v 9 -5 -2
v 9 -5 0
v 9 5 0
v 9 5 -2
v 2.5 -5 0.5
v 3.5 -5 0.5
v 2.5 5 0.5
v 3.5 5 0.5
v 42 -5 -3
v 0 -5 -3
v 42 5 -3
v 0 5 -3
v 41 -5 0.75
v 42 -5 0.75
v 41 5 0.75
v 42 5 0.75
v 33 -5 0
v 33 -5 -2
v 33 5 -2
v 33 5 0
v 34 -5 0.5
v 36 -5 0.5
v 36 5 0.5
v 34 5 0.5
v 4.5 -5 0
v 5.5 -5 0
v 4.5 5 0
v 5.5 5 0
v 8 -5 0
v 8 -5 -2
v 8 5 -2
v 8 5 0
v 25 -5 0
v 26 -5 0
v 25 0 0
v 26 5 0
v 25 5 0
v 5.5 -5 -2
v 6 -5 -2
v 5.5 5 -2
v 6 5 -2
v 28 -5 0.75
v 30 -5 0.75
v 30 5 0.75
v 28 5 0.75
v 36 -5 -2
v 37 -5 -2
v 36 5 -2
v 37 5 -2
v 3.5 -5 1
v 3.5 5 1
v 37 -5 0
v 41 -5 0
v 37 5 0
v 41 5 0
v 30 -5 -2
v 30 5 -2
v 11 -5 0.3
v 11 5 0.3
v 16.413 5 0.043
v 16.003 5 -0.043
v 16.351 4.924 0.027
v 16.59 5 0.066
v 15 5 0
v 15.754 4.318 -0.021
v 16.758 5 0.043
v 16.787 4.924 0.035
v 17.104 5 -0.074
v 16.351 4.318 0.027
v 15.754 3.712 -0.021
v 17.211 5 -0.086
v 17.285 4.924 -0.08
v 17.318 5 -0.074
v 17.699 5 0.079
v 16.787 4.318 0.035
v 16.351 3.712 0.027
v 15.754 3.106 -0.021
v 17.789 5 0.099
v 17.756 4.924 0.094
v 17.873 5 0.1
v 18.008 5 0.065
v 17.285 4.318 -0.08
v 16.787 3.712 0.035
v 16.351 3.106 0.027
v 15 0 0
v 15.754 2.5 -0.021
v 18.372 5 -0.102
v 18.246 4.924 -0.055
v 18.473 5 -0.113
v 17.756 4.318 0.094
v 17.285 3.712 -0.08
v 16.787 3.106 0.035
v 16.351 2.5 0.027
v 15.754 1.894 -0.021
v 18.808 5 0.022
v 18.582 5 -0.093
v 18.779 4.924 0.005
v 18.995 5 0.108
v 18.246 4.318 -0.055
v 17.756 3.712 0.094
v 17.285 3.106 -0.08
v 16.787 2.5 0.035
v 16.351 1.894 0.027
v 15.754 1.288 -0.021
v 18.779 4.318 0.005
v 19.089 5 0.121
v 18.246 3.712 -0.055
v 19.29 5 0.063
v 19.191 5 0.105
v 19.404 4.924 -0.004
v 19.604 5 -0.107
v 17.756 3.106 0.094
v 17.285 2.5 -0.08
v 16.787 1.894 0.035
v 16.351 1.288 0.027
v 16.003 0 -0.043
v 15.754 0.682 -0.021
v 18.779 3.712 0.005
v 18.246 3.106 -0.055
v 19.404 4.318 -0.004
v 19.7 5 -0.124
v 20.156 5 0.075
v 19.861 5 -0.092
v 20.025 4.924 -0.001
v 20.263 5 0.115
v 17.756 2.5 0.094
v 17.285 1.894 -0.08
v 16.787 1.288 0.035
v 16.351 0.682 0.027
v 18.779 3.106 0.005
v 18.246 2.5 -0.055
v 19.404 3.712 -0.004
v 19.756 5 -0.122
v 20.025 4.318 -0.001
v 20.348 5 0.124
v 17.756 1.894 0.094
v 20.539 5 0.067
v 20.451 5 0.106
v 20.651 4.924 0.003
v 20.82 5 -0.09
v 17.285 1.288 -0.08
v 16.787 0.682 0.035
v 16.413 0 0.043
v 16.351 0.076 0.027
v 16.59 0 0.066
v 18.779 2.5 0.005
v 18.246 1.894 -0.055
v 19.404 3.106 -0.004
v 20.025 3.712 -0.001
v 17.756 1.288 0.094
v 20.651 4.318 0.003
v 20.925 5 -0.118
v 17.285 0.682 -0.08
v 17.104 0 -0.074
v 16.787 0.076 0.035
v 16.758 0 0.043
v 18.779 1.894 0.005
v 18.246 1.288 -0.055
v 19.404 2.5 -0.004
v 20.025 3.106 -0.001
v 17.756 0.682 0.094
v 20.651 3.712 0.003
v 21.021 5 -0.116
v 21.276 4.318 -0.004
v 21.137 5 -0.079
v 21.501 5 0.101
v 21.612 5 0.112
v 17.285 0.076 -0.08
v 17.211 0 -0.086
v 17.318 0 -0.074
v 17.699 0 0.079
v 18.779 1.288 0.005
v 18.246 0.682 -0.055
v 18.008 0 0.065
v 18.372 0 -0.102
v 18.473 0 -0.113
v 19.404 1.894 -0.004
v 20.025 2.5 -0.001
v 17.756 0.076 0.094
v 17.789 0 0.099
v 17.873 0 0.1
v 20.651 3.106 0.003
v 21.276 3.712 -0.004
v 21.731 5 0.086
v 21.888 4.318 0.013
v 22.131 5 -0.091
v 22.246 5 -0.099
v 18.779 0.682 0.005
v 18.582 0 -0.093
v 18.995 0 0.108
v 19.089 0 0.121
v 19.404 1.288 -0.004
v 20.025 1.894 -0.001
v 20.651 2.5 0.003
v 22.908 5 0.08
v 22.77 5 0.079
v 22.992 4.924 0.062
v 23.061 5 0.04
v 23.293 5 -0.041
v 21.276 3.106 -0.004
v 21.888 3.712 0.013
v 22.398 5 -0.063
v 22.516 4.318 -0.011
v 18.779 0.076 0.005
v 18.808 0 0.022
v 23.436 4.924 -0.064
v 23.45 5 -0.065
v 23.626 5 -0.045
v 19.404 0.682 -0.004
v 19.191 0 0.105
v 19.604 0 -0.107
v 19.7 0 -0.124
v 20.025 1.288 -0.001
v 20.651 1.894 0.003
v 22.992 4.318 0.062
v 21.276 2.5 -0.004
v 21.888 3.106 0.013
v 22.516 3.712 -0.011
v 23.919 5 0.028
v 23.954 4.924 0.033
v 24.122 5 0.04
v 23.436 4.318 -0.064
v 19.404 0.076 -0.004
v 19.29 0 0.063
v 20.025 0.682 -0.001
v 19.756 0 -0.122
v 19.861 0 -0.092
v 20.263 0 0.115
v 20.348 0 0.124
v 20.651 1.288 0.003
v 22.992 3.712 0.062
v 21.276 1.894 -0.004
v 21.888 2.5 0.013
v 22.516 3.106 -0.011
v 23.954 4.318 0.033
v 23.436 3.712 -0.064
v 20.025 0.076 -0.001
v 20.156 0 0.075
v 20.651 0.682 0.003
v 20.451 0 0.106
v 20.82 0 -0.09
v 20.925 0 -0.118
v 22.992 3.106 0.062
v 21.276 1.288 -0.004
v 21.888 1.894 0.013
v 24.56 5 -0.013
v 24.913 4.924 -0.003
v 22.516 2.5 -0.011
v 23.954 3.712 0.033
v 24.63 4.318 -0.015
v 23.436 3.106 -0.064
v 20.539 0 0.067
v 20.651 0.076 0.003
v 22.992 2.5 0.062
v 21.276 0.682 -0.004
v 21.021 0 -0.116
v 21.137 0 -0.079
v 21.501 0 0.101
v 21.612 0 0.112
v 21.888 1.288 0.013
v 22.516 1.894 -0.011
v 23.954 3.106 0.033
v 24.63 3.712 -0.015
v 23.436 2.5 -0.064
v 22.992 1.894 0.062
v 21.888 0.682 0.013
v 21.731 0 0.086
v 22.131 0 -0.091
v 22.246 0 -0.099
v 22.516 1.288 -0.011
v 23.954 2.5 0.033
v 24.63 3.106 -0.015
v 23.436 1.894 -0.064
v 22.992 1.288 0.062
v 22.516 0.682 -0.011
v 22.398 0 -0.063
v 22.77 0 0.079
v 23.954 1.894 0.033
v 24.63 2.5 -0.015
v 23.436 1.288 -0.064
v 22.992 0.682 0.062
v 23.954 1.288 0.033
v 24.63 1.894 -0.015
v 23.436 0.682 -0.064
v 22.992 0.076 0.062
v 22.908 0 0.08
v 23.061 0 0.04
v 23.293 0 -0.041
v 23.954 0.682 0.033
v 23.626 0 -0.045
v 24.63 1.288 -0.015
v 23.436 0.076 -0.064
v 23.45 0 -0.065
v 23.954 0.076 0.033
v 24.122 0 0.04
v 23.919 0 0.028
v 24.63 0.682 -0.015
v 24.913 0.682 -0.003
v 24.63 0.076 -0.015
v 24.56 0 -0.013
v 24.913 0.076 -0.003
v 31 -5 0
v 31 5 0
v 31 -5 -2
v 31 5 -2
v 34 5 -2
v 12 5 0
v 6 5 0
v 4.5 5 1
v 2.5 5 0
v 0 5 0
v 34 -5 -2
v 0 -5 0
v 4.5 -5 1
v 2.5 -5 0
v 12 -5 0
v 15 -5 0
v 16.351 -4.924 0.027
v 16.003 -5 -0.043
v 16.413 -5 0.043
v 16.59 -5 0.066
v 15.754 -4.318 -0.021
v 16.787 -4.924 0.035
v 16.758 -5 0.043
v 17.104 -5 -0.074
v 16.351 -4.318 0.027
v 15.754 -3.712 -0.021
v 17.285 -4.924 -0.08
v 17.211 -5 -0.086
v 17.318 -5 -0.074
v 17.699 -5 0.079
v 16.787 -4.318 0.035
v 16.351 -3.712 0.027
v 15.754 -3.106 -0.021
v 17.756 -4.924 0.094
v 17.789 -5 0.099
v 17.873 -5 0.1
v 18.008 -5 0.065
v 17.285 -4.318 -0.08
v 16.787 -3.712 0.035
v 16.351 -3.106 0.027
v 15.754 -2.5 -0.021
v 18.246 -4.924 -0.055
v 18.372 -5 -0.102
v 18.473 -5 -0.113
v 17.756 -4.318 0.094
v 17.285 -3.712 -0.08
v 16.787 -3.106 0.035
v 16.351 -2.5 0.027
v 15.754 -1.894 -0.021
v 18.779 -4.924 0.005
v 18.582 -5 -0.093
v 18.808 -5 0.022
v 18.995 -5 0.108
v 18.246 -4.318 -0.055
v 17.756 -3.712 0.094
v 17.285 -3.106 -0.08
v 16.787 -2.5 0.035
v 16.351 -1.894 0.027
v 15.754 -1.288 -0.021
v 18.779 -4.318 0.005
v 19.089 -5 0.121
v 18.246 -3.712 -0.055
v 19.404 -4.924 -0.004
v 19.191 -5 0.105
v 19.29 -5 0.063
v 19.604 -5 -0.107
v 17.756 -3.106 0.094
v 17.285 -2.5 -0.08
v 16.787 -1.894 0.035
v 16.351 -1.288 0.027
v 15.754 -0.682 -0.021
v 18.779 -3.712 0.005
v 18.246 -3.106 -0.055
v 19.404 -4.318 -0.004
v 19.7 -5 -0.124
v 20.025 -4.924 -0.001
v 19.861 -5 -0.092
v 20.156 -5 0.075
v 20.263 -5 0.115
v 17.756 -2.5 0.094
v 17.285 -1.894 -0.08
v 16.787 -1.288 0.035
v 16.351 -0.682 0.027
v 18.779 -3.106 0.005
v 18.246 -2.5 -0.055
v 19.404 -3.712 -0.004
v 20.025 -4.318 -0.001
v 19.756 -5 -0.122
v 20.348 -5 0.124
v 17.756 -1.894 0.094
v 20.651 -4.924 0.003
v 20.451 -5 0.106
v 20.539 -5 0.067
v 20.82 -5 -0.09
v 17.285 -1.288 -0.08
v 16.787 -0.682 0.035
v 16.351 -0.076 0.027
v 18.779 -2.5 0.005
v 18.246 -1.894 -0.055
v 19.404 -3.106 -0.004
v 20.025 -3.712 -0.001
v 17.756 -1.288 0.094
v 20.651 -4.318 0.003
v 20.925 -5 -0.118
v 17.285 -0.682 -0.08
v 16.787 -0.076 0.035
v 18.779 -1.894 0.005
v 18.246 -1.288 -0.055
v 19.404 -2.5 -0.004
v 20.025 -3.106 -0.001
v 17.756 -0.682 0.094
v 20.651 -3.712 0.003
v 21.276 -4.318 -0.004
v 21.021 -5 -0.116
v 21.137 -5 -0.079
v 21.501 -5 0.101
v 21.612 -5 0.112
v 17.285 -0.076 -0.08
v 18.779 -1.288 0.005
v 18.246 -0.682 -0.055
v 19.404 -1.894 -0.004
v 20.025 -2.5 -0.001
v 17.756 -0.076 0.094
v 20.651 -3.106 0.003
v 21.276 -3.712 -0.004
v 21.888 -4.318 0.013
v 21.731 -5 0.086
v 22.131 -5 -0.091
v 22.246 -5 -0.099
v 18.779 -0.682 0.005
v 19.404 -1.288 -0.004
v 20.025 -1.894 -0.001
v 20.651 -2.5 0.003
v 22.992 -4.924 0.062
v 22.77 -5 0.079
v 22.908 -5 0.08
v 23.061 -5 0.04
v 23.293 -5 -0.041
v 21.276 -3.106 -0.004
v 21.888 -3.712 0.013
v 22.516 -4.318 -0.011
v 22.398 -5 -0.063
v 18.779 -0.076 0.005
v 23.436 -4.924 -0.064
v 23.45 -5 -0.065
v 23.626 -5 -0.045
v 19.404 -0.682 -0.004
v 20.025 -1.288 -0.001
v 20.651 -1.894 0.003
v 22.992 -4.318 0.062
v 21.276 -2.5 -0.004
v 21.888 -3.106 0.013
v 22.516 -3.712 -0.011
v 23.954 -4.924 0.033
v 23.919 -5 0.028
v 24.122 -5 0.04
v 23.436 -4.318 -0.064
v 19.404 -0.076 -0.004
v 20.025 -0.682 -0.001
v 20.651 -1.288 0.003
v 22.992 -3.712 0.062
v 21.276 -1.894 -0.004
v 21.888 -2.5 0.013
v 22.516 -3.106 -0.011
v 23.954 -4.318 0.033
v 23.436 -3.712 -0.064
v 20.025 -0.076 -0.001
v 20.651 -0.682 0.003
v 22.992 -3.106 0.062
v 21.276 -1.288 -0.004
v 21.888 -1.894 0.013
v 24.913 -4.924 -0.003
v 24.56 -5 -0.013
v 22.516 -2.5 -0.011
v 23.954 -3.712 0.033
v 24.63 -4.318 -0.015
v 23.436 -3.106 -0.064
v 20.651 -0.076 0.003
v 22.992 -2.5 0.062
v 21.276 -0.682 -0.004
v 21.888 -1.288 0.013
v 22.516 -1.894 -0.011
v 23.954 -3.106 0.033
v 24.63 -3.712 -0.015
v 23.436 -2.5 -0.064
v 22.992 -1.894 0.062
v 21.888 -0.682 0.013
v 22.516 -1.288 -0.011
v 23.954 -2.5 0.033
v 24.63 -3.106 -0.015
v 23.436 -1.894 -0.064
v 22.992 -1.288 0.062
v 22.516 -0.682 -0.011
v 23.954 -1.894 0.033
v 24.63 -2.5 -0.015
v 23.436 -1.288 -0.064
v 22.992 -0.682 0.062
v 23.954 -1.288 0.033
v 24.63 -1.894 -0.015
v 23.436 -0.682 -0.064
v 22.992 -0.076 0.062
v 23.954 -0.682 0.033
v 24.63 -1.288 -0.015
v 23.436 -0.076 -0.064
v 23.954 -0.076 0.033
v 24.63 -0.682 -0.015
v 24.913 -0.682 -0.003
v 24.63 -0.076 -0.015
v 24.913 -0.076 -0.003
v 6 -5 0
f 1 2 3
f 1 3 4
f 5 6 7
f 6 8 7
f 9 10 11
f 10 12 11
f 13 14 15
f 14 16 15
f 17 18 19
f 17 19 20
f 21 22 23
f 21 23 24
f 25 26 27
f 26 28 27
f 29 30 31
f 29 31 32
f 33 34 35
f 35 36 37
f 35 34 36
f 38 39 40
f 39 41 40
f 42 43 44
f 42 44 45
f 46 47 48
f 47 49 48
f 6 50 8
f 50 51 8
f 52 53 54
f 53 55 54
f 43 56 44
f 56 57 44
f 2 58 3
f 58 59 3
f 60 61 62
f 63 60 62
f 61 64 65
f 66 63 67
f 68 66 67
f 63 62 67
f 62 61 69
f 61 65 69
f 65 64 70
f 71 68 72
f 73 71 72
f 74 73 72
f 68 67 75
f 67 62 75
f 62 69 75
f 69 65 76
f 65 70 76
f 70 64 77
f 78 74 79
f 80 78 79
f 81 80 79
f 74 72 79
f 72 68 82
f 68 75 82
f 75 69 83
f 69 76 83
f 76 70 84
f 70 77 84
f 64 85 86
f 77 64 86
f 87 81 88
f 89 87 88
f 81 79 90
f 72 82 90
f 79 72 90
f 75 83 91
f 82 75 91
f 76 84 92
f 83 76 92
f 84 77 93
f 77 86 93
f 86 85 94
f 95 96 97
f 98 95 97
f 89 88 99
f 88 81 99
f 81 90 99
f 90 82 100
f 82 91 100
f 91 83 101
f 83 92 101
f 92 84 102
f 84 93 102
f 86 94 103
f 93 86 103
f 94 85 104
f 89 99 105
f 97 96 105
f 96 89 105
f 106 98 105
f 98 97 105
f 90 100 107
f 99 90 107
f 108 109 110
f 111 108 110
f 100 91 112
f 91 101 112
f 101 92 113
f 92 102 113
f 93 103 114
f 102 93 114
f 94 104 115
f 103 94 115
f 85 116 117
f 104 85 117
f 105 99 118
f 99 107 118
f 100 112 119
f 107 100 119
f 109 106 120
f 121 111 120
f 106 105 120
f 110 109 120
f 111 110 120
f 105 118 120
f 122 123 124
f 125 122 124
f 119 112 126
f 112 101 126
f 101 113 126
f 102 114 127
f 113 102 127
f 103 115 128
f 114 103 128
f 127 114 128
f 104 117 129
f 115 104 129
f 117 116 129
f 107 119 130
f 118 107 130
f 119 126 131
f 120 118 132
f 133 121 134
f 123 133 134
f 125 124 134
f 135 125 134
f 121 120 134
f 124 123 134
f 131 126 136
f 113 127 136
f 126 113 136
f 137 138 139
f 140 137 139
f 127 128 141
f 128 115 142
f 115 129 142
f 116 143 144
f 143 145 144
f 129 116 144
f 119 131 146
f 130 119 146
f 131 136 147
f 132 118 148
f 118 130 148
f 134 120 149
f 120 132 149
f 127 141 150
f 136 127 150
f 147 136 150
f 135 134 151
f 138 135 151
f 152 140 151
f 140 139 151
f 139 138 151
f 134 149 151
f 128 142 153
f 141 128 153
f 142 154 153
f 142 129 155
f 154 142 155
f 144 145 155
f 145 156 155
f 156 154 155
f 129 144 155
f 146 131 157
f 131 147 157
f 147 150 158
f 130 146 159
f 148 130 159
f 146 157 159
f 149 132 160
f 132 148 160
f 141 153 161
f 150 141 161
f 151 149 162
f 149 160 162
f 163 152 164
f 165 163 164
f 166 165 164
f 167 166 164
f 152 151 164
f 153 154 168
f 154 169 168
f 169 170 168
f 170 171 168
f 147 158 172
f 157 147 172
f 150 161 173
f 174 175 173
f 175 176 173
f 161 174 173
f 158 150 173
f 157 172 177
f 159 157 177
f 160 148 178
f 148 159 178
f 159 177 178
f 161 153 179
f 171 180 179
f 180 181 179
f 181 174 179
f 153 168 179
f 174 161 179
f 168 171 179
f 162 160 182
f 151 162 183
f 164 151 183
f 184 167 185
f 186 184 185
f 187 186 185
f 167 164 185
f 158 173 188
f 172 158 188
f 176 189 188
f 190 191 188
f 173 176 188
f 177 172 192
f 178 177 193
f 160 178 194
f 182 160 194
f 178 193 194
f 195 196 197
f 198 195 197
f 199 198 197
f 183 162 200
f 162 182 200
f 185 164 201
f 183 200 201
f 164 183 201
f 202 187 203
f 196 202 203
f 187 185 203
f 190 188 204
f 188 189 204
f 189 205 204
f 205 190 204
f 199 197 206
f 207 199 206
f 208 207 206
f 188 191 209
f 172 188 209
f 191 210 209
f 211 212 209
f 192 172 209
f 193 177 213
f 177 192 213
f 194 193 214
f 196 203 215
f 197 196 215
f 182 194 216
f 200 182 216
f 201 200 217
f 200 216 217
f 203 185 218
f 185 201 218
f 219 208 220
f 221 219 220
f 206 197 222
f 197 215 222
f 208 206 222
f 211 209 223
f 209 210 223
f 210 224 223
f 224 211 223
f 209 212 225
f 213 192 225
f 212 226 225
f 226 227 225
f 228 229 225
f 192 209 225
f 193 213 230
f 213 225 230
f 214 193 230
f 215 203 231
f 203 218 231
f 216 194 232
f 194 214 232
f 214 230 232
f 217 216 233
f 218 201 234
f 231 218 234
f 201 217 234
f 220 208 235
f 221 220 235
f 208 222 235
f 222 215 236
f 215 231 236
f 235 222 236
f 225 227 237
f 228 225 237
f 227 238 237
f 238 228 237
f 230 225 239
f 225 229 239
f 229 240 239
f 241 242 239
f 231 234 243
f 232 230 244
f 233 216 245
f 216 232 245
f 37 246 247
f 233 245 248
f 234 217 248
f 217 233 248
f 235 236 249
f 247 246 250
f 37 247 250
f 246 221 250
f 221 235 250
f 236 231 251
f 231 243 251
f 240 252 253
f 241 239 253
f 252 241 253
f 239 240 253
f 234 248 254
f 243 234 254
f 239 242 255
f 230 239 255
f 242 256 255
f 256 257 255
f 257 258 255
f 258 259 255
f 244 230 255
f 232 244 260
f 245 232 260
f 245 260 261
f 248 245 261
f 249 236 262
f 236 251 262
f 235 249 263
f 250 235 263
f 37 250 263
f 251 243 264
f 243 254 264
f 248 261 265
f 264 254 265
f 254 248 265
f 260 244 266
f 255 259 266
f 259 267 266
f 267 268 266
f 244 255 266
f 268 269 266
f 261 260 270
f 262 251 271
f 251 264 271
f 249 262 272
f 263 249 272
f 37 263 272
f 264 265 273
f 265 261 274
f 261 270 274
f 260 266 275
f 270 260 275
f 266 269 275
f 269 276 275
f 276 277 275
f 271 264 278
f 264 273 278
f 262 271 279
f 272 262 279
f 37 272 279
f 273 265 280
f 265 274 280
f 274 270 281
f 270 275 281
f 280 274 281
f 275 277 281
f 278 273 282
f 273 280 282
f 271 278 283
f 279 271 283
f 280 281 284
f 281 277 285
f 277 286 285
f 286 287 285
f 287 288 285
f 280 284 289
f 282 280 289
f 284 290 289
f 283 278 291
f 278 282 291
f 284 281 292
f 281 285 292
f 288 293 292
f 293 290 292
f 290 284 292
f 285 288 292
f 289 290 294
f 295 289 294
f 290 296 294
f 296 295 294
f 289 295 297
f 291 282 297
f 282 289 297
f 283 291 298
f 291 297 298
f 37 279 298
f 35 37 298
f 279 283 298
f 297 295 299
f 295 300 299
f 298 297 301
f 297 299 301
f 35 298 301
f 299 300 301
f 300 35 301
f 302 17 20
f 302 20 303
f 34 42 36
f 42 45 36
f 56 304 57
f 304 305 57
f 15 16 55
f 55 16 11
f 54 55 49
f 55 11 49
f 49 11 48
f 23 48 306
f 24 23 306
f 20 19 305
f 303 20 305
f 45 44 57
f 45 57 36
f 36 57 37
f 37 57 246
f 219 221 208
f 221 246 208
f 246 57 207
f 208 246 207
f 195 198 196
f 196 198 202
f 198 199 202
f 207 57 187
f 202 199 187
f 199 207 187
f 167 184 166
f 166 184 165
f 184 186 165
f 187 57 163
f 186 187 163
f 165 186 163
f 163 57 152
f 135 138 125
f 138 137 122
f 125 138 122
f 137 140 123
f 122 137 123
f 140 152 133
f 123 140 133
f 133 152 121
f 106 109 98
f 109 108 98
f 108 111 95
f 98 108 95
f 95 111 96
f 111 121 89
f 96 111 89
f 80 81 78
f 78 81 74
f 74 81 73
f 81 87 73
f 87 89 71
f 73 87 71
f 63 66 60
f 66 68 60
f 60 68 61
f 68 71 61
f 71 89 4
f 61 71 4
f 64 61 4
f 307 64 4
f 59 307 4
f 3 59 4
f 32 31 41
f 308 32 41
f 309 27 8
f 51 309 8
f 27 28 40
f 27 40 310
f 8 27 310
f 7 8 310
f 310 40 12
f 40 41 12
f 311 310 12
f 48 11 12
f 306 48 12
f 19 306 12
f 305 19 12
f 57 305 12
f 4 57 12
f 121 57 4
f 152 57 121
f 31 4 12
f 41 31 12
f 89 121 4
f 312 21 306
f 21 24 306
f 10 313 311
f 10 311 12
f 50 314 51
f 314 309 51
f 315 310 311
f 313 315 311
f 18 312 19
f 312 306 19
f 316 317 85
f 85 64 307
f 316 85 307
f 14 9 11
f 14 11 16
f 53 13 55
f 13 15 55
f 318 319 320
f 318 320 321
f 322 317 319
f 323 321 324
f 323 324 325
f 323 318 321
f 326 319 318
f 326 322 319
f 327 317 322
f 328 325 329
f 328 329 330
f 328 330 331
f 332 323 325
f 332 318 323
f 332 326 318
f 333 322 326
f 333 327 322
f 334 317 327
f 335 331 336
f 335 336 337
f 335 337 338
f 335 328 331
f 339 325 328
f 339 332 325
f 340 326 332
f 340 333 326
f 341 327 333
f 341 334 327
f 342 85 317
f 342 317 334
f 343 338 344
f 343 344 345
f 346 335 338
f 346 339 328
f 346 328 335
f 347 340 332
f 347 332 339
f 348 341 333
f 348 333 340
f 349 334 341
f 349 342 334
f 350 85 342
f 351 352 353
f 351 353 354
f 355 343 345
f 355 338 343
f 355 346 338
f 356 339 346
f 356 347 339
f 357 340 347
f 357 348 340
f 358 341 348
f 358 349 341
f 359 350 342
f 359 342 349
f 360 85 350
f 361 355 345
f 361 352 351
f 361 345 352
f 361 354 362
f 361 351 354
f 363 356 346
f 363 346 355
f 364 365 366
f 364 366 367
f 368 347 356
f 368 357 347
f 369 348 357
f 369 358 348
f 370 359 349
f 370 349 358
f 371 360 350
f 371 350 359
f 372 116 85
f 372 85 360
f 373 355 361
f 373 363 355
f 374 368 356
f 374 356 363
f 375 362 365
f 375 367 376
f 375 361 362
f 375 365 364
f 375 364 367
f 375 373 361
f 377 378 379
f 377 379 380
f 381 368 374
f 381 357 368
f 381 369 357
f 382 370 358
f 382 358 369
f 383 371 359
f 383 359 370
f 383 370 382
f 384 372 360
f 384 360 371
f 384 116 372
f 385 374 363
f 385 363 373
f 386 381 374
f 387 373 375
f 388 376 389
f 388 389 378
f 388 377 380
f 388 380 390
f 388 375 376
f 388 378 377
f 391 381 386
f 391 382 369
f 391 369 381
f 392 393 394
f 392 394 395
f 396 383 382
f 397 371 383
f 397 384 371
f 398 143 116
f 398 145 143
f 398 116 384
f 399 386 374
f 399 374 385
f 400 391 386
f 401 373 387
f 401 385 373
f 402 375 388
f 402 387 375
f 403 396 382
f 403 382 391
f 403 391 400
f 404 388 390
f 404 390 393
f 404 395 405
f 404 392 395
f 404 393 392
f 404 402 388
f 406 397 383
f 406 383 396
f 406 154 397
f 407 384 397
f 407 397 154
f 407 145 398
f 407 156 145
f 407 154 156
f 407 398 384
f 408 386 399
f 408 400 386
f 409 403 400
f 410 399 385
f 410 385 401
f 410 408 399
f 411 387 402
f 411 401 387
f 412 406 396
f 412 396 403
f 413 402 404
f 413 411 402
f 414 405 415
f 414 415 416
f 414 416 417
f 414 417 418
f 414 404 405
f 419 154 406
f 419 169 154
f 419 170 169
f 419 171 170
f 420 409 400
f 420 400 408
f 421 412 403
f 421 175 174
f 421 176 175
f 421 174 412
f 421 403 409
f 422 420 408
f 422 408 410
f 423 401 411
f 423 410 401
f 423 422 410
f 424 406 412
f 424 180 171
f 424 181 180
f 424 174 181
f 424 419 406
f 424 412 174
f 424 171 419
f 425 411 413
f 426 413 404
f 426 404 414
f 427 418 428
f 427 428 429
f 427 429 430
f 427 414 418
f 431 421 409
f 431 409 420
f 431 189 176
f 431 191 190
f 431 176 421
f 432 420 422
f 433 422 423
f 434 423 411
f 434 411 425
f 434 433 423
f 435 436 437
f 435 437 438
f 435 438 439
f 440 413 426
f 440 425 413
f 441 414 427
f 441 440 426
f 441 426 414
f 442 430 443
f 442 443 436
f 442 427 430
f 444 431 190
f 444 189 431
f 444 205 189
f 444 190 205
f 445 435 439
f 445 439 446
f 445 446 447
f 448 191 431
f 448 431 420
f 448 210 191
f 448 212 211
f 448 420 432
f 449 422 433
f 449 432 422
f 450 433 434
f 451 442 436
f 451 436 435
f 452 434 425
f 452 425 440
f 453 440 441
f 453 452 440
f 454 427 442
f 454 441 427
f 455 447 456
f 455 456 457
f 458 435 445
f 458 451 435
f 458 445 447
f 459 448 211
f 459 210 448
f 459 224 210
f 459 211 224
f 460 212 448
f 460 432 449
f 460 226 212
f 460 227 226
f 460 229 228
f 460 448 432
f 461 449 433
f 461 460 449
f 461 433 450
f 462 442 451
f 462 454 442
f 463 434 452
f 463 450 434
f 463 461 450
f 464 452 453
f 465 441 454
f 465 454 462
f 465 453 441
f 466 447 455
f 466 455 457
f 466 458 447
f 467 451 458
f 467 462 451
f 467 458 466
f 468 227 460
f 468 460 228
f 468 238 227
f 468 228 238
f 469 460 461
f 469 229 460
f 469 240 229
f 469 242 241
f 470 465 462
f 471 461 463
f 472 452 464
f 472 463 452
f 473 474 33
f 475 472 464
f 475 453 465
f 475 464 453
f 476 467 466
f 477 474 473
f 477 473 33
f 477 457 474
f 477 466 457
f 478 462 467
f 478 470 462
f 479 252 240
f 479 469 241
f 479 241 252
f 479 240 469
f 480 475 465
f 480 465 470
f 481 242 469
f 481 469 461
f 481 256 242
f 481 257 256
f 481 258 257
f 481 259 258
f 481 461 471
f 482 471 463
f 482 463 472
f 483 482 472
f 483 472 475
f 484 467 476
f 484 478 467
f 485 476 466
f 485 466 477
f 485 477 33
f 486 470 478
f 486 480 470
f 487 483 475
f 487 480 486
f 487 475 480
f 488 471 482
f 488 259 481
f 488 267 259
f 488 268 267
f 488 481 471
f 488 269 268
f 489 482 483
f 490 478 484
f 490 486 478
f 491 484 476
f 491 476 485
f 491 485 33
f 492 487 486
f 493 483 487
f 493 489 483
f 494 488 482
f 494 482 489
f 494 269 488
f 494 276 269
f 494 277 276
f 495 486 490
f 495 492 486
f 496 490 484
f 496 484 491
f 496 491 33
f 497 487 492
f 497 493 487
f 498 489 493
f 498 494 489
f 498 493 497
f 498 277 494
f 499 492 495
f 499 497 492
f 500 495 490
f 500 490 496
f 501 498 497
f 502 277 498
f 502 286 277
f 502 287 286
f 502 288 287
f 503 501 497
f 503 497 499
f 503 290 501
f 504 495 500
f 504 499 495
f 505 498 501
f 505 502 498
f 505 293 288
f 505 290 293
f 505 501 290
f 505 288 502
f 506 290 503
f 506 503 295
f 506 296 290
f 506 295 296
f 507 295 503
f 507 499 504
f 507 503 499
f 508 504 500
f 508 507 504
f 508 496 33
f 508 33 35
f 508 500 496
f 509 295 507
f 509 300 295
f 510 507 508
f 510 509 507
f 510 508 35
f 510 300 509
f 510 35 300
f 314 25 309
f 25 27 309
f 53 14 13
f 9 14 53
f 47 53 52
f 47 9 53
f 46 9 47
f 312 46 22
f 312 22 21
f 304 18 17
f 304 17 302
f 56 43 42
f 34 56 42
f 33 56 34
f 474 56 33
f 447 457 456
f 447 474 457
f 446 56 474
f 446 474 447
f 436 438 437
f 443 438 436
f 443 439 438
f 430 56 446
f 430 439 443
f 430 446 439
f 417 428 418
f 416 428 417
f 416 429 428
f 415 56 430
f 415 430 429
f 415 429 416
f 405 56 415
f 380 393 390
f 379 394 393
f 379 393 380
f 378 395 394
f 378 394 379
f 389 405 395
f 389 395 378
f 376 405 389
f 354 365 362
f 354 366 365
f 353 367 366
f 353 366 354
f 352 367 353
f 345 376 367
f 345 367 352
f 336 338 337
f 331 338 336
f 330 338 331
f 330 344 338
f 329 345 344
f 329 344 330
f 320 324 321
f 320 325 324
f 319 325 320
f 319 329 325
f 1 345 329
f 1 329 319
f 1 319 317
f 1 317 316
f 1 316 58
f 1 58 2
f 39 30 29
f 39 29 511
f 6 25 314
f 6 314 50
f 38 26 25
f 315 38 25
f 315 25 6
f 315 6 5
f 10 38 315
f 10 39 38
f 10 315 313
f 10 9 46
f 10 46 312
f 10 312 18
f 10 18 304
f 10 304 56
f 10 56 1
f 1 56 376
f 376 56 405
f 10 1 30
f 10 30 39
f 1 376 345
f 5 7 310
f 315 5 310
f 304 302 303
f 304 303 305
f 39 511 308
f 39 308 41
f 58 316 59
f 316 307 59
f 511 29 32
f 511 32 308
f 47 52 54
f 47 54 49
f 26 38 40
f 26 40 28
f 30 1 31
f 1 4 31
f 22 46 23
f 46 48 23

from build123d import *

# Parameters (mm, degrees)
EXTRUDE_1_DEPTH = 5


with BuildPart() as part:
    # 草图1 → 凸台-拉伸1 (new body, symmetric)
    with BuildSketch(Plane(origin=(0, 0, 0), x_dir=(1, 0, 0), z_dir=(0, 1, 0))):
        with BuildLine():
            Line((0, 0), (0, 3))
            Line((0, 3), (42, 3))
            Line((42, 3), (42, -0.75))
            Line((42, -0.75), (41, -0.75))
            Line((41, -0.75), (41, 0))
            Line((41, 0), (37, 0))
            Line((37, 0), (37, 2))
            Line((37, 2), (36, 2))
            Line((36, 2), (36, -0.5))
            Line((36, -0.5), (34, -0.5))
            Line((34, -0.5), (34, 2))
            Line((34, 2), (33, 2))
            Line((33, 2), (33, 0))
            Line((33, 0), (31, 0))
            Line((31, 0), (31, 2))
            Line((31, 2), (30, 2))
            Line((30, 2), (30, -0.75))
            Line((30, -0.75), (28, -0.75))
            Line((28, -0.75), (26, 0))
            Line((26, 0), (25, 0))
            add(Edge.make_bspline(
                [(15, 0), (15.019852379, 0), (15.060190558, -0.000731178), (15.170958225, -0.004993424), (15.304514791, -0.017003842), (15.474252144, -0.021487702), (15.68874463, 0.004937048), (15.893861657, 0.051909588), (16.094951986, 0.044850487), (16.295817919, -0.009198636), (16.472538126, -0.066588084), (16.69222545, -0.079729643), (16.888335149, 0.000528924), (17.057792019, 0.071283945), (17.21996953, 0.094390627), (17.347292458, 0.072033865), (17.465227624, 0.024389734), (17.578141197, -0.031891345), (17.698483931, -0.084840948), (17.835520741, -0.113450201), (17.97049161, -0.086701778), (18.088481622, -0.029788445), (18.195304005, 0.029919779), (18.296356752, 0.08125789), (18.419356141, 0.120991981), (18.565356334, 0.111821211), (18.707223229, 0.039142021), (18.849825719, -0.049006587), (19.004553287, -0.12913704), (19.182498155, -0.125477201), (19.333914462, -0.040957938), (19.473953485, 0.048104078), (19.625939165, 0.131731177), (19.803927697, 0.130852507), (19.955368453, 0.04586001), (20.095152965, -0.044159697), (20.246692264, -0.130036088), (20.425953601, -0.13233286), (20.579865028, -0.047628059), (20.721610821, 0.042597321), (20.875124879, 0.126850879), (21.052917266, 0.126831512), (21.205681567, 0.047140906), (21.346635582, -0.039353707), (21.485341862, -0.109599979), (21.626264904, -0.120139718), (21.74489324, -0.085169656), (21.841126768, -0.038617733), (21.945725191, 0.019145441), (22.061511684, 0.07771784), (22.228121545, 0.120686636), (22.399545356, 0.071438402), (22.54263056, -0.004711258), (22.687559945, -0.064819036), (22.80938576, -0.090770941), (22.933479525, -0.081171782), (23.050482764, -0.045843176), (23.160886922, -0.001969054), (23.270309992, 0.037903038), (23.407269761, 0.0699359), (23.598735058, 0.065525517), (23.820769111, -0.018043876), (24.077234518, -0.062657182), (24.323354641, -0.012520022), (24.534895962, 0.01664141), (24.70139475, 0.017113956), (24.832869481, 0.006461173), (24.940989195, 0.001444486), (24.980546523, 0.000255205), (25, 0)],
                knots=[0.080420158, 0.080420158, 0.080420158, 0.080420158, 0.080420158, 0.08798504, 0.095549922, 0.110679687, 0.125809451, 0.140939215, 0.16517557, 0.177293748, 0.189411925, 0.207122949, 0.224833973, 0.245520981, 0.255864485, 0.266207988, 0.276282774, 0.28635756, 0.296432346, 0.306507132, 0.318373913, 0.330240694, 0.339311626, 0.348382559, 0.357453492, 0.366524424, 0.380143825, 0.393763225, 0.407382626, 0.421002027, 0.434517018, 0.448032009, 0.461547, 0.475061991, 0.488607776, 0.502153562, 0.515699347, 0.529245132, 0.542954524, 0.556663916, 0.570373307, 0.584082699, 0.597491202, 0.610899704, 0.624308207, 0.637716709, 0.646276459, 0.65483621, 0.66339596, 0.67195571, 0.684299222, 0.696642734, 0.716675493, 0.726691872, 0.736708251, 0.746449596, 0.75619094, 0.765932285, 0.77567363, 0.784483857, 0.793294084, 0.810914537, 0.835554636, 0.860194735, 0.875021766, 0.889848798, 0.904675829, 0.912089345, 0.919502861, 0.919502861, 0.919502861, 0.919502861, 0.919502861], degree=4))
            Line((15, 0), (12, 0))
            Line((12, 0), (11, -0.3))
            Line((11, -0.3), (9, 0))
            Line((9, 0), (9, 2))
            Line((9, 2), (8, 2))
            Line((8, 2), (8, 0))
            Line((8, 0), (6, 0))
            Line((6, 0), (6, 2))
            Line((6, 2), (5.5, 2))
            Line((5.5, 2), (5.5, 0))
            Line((5.5, 0), (4.5, 0))
            Line((4.5, 0), (4.5, -1))
            Line((4.5, -1), (3.5, -1))
            Line((3.5, -1), (3.5, -0.5))
            Line((3.5, -0.5), (2.5, -0.5))
            Line((2.5, -0.5), (2.5, 0))
            Line((2.5, 0), (0, 0))
        make_face()
    extrude(amount=EXTRUDE_1_DEPTH, both=True)


solid = part.part
